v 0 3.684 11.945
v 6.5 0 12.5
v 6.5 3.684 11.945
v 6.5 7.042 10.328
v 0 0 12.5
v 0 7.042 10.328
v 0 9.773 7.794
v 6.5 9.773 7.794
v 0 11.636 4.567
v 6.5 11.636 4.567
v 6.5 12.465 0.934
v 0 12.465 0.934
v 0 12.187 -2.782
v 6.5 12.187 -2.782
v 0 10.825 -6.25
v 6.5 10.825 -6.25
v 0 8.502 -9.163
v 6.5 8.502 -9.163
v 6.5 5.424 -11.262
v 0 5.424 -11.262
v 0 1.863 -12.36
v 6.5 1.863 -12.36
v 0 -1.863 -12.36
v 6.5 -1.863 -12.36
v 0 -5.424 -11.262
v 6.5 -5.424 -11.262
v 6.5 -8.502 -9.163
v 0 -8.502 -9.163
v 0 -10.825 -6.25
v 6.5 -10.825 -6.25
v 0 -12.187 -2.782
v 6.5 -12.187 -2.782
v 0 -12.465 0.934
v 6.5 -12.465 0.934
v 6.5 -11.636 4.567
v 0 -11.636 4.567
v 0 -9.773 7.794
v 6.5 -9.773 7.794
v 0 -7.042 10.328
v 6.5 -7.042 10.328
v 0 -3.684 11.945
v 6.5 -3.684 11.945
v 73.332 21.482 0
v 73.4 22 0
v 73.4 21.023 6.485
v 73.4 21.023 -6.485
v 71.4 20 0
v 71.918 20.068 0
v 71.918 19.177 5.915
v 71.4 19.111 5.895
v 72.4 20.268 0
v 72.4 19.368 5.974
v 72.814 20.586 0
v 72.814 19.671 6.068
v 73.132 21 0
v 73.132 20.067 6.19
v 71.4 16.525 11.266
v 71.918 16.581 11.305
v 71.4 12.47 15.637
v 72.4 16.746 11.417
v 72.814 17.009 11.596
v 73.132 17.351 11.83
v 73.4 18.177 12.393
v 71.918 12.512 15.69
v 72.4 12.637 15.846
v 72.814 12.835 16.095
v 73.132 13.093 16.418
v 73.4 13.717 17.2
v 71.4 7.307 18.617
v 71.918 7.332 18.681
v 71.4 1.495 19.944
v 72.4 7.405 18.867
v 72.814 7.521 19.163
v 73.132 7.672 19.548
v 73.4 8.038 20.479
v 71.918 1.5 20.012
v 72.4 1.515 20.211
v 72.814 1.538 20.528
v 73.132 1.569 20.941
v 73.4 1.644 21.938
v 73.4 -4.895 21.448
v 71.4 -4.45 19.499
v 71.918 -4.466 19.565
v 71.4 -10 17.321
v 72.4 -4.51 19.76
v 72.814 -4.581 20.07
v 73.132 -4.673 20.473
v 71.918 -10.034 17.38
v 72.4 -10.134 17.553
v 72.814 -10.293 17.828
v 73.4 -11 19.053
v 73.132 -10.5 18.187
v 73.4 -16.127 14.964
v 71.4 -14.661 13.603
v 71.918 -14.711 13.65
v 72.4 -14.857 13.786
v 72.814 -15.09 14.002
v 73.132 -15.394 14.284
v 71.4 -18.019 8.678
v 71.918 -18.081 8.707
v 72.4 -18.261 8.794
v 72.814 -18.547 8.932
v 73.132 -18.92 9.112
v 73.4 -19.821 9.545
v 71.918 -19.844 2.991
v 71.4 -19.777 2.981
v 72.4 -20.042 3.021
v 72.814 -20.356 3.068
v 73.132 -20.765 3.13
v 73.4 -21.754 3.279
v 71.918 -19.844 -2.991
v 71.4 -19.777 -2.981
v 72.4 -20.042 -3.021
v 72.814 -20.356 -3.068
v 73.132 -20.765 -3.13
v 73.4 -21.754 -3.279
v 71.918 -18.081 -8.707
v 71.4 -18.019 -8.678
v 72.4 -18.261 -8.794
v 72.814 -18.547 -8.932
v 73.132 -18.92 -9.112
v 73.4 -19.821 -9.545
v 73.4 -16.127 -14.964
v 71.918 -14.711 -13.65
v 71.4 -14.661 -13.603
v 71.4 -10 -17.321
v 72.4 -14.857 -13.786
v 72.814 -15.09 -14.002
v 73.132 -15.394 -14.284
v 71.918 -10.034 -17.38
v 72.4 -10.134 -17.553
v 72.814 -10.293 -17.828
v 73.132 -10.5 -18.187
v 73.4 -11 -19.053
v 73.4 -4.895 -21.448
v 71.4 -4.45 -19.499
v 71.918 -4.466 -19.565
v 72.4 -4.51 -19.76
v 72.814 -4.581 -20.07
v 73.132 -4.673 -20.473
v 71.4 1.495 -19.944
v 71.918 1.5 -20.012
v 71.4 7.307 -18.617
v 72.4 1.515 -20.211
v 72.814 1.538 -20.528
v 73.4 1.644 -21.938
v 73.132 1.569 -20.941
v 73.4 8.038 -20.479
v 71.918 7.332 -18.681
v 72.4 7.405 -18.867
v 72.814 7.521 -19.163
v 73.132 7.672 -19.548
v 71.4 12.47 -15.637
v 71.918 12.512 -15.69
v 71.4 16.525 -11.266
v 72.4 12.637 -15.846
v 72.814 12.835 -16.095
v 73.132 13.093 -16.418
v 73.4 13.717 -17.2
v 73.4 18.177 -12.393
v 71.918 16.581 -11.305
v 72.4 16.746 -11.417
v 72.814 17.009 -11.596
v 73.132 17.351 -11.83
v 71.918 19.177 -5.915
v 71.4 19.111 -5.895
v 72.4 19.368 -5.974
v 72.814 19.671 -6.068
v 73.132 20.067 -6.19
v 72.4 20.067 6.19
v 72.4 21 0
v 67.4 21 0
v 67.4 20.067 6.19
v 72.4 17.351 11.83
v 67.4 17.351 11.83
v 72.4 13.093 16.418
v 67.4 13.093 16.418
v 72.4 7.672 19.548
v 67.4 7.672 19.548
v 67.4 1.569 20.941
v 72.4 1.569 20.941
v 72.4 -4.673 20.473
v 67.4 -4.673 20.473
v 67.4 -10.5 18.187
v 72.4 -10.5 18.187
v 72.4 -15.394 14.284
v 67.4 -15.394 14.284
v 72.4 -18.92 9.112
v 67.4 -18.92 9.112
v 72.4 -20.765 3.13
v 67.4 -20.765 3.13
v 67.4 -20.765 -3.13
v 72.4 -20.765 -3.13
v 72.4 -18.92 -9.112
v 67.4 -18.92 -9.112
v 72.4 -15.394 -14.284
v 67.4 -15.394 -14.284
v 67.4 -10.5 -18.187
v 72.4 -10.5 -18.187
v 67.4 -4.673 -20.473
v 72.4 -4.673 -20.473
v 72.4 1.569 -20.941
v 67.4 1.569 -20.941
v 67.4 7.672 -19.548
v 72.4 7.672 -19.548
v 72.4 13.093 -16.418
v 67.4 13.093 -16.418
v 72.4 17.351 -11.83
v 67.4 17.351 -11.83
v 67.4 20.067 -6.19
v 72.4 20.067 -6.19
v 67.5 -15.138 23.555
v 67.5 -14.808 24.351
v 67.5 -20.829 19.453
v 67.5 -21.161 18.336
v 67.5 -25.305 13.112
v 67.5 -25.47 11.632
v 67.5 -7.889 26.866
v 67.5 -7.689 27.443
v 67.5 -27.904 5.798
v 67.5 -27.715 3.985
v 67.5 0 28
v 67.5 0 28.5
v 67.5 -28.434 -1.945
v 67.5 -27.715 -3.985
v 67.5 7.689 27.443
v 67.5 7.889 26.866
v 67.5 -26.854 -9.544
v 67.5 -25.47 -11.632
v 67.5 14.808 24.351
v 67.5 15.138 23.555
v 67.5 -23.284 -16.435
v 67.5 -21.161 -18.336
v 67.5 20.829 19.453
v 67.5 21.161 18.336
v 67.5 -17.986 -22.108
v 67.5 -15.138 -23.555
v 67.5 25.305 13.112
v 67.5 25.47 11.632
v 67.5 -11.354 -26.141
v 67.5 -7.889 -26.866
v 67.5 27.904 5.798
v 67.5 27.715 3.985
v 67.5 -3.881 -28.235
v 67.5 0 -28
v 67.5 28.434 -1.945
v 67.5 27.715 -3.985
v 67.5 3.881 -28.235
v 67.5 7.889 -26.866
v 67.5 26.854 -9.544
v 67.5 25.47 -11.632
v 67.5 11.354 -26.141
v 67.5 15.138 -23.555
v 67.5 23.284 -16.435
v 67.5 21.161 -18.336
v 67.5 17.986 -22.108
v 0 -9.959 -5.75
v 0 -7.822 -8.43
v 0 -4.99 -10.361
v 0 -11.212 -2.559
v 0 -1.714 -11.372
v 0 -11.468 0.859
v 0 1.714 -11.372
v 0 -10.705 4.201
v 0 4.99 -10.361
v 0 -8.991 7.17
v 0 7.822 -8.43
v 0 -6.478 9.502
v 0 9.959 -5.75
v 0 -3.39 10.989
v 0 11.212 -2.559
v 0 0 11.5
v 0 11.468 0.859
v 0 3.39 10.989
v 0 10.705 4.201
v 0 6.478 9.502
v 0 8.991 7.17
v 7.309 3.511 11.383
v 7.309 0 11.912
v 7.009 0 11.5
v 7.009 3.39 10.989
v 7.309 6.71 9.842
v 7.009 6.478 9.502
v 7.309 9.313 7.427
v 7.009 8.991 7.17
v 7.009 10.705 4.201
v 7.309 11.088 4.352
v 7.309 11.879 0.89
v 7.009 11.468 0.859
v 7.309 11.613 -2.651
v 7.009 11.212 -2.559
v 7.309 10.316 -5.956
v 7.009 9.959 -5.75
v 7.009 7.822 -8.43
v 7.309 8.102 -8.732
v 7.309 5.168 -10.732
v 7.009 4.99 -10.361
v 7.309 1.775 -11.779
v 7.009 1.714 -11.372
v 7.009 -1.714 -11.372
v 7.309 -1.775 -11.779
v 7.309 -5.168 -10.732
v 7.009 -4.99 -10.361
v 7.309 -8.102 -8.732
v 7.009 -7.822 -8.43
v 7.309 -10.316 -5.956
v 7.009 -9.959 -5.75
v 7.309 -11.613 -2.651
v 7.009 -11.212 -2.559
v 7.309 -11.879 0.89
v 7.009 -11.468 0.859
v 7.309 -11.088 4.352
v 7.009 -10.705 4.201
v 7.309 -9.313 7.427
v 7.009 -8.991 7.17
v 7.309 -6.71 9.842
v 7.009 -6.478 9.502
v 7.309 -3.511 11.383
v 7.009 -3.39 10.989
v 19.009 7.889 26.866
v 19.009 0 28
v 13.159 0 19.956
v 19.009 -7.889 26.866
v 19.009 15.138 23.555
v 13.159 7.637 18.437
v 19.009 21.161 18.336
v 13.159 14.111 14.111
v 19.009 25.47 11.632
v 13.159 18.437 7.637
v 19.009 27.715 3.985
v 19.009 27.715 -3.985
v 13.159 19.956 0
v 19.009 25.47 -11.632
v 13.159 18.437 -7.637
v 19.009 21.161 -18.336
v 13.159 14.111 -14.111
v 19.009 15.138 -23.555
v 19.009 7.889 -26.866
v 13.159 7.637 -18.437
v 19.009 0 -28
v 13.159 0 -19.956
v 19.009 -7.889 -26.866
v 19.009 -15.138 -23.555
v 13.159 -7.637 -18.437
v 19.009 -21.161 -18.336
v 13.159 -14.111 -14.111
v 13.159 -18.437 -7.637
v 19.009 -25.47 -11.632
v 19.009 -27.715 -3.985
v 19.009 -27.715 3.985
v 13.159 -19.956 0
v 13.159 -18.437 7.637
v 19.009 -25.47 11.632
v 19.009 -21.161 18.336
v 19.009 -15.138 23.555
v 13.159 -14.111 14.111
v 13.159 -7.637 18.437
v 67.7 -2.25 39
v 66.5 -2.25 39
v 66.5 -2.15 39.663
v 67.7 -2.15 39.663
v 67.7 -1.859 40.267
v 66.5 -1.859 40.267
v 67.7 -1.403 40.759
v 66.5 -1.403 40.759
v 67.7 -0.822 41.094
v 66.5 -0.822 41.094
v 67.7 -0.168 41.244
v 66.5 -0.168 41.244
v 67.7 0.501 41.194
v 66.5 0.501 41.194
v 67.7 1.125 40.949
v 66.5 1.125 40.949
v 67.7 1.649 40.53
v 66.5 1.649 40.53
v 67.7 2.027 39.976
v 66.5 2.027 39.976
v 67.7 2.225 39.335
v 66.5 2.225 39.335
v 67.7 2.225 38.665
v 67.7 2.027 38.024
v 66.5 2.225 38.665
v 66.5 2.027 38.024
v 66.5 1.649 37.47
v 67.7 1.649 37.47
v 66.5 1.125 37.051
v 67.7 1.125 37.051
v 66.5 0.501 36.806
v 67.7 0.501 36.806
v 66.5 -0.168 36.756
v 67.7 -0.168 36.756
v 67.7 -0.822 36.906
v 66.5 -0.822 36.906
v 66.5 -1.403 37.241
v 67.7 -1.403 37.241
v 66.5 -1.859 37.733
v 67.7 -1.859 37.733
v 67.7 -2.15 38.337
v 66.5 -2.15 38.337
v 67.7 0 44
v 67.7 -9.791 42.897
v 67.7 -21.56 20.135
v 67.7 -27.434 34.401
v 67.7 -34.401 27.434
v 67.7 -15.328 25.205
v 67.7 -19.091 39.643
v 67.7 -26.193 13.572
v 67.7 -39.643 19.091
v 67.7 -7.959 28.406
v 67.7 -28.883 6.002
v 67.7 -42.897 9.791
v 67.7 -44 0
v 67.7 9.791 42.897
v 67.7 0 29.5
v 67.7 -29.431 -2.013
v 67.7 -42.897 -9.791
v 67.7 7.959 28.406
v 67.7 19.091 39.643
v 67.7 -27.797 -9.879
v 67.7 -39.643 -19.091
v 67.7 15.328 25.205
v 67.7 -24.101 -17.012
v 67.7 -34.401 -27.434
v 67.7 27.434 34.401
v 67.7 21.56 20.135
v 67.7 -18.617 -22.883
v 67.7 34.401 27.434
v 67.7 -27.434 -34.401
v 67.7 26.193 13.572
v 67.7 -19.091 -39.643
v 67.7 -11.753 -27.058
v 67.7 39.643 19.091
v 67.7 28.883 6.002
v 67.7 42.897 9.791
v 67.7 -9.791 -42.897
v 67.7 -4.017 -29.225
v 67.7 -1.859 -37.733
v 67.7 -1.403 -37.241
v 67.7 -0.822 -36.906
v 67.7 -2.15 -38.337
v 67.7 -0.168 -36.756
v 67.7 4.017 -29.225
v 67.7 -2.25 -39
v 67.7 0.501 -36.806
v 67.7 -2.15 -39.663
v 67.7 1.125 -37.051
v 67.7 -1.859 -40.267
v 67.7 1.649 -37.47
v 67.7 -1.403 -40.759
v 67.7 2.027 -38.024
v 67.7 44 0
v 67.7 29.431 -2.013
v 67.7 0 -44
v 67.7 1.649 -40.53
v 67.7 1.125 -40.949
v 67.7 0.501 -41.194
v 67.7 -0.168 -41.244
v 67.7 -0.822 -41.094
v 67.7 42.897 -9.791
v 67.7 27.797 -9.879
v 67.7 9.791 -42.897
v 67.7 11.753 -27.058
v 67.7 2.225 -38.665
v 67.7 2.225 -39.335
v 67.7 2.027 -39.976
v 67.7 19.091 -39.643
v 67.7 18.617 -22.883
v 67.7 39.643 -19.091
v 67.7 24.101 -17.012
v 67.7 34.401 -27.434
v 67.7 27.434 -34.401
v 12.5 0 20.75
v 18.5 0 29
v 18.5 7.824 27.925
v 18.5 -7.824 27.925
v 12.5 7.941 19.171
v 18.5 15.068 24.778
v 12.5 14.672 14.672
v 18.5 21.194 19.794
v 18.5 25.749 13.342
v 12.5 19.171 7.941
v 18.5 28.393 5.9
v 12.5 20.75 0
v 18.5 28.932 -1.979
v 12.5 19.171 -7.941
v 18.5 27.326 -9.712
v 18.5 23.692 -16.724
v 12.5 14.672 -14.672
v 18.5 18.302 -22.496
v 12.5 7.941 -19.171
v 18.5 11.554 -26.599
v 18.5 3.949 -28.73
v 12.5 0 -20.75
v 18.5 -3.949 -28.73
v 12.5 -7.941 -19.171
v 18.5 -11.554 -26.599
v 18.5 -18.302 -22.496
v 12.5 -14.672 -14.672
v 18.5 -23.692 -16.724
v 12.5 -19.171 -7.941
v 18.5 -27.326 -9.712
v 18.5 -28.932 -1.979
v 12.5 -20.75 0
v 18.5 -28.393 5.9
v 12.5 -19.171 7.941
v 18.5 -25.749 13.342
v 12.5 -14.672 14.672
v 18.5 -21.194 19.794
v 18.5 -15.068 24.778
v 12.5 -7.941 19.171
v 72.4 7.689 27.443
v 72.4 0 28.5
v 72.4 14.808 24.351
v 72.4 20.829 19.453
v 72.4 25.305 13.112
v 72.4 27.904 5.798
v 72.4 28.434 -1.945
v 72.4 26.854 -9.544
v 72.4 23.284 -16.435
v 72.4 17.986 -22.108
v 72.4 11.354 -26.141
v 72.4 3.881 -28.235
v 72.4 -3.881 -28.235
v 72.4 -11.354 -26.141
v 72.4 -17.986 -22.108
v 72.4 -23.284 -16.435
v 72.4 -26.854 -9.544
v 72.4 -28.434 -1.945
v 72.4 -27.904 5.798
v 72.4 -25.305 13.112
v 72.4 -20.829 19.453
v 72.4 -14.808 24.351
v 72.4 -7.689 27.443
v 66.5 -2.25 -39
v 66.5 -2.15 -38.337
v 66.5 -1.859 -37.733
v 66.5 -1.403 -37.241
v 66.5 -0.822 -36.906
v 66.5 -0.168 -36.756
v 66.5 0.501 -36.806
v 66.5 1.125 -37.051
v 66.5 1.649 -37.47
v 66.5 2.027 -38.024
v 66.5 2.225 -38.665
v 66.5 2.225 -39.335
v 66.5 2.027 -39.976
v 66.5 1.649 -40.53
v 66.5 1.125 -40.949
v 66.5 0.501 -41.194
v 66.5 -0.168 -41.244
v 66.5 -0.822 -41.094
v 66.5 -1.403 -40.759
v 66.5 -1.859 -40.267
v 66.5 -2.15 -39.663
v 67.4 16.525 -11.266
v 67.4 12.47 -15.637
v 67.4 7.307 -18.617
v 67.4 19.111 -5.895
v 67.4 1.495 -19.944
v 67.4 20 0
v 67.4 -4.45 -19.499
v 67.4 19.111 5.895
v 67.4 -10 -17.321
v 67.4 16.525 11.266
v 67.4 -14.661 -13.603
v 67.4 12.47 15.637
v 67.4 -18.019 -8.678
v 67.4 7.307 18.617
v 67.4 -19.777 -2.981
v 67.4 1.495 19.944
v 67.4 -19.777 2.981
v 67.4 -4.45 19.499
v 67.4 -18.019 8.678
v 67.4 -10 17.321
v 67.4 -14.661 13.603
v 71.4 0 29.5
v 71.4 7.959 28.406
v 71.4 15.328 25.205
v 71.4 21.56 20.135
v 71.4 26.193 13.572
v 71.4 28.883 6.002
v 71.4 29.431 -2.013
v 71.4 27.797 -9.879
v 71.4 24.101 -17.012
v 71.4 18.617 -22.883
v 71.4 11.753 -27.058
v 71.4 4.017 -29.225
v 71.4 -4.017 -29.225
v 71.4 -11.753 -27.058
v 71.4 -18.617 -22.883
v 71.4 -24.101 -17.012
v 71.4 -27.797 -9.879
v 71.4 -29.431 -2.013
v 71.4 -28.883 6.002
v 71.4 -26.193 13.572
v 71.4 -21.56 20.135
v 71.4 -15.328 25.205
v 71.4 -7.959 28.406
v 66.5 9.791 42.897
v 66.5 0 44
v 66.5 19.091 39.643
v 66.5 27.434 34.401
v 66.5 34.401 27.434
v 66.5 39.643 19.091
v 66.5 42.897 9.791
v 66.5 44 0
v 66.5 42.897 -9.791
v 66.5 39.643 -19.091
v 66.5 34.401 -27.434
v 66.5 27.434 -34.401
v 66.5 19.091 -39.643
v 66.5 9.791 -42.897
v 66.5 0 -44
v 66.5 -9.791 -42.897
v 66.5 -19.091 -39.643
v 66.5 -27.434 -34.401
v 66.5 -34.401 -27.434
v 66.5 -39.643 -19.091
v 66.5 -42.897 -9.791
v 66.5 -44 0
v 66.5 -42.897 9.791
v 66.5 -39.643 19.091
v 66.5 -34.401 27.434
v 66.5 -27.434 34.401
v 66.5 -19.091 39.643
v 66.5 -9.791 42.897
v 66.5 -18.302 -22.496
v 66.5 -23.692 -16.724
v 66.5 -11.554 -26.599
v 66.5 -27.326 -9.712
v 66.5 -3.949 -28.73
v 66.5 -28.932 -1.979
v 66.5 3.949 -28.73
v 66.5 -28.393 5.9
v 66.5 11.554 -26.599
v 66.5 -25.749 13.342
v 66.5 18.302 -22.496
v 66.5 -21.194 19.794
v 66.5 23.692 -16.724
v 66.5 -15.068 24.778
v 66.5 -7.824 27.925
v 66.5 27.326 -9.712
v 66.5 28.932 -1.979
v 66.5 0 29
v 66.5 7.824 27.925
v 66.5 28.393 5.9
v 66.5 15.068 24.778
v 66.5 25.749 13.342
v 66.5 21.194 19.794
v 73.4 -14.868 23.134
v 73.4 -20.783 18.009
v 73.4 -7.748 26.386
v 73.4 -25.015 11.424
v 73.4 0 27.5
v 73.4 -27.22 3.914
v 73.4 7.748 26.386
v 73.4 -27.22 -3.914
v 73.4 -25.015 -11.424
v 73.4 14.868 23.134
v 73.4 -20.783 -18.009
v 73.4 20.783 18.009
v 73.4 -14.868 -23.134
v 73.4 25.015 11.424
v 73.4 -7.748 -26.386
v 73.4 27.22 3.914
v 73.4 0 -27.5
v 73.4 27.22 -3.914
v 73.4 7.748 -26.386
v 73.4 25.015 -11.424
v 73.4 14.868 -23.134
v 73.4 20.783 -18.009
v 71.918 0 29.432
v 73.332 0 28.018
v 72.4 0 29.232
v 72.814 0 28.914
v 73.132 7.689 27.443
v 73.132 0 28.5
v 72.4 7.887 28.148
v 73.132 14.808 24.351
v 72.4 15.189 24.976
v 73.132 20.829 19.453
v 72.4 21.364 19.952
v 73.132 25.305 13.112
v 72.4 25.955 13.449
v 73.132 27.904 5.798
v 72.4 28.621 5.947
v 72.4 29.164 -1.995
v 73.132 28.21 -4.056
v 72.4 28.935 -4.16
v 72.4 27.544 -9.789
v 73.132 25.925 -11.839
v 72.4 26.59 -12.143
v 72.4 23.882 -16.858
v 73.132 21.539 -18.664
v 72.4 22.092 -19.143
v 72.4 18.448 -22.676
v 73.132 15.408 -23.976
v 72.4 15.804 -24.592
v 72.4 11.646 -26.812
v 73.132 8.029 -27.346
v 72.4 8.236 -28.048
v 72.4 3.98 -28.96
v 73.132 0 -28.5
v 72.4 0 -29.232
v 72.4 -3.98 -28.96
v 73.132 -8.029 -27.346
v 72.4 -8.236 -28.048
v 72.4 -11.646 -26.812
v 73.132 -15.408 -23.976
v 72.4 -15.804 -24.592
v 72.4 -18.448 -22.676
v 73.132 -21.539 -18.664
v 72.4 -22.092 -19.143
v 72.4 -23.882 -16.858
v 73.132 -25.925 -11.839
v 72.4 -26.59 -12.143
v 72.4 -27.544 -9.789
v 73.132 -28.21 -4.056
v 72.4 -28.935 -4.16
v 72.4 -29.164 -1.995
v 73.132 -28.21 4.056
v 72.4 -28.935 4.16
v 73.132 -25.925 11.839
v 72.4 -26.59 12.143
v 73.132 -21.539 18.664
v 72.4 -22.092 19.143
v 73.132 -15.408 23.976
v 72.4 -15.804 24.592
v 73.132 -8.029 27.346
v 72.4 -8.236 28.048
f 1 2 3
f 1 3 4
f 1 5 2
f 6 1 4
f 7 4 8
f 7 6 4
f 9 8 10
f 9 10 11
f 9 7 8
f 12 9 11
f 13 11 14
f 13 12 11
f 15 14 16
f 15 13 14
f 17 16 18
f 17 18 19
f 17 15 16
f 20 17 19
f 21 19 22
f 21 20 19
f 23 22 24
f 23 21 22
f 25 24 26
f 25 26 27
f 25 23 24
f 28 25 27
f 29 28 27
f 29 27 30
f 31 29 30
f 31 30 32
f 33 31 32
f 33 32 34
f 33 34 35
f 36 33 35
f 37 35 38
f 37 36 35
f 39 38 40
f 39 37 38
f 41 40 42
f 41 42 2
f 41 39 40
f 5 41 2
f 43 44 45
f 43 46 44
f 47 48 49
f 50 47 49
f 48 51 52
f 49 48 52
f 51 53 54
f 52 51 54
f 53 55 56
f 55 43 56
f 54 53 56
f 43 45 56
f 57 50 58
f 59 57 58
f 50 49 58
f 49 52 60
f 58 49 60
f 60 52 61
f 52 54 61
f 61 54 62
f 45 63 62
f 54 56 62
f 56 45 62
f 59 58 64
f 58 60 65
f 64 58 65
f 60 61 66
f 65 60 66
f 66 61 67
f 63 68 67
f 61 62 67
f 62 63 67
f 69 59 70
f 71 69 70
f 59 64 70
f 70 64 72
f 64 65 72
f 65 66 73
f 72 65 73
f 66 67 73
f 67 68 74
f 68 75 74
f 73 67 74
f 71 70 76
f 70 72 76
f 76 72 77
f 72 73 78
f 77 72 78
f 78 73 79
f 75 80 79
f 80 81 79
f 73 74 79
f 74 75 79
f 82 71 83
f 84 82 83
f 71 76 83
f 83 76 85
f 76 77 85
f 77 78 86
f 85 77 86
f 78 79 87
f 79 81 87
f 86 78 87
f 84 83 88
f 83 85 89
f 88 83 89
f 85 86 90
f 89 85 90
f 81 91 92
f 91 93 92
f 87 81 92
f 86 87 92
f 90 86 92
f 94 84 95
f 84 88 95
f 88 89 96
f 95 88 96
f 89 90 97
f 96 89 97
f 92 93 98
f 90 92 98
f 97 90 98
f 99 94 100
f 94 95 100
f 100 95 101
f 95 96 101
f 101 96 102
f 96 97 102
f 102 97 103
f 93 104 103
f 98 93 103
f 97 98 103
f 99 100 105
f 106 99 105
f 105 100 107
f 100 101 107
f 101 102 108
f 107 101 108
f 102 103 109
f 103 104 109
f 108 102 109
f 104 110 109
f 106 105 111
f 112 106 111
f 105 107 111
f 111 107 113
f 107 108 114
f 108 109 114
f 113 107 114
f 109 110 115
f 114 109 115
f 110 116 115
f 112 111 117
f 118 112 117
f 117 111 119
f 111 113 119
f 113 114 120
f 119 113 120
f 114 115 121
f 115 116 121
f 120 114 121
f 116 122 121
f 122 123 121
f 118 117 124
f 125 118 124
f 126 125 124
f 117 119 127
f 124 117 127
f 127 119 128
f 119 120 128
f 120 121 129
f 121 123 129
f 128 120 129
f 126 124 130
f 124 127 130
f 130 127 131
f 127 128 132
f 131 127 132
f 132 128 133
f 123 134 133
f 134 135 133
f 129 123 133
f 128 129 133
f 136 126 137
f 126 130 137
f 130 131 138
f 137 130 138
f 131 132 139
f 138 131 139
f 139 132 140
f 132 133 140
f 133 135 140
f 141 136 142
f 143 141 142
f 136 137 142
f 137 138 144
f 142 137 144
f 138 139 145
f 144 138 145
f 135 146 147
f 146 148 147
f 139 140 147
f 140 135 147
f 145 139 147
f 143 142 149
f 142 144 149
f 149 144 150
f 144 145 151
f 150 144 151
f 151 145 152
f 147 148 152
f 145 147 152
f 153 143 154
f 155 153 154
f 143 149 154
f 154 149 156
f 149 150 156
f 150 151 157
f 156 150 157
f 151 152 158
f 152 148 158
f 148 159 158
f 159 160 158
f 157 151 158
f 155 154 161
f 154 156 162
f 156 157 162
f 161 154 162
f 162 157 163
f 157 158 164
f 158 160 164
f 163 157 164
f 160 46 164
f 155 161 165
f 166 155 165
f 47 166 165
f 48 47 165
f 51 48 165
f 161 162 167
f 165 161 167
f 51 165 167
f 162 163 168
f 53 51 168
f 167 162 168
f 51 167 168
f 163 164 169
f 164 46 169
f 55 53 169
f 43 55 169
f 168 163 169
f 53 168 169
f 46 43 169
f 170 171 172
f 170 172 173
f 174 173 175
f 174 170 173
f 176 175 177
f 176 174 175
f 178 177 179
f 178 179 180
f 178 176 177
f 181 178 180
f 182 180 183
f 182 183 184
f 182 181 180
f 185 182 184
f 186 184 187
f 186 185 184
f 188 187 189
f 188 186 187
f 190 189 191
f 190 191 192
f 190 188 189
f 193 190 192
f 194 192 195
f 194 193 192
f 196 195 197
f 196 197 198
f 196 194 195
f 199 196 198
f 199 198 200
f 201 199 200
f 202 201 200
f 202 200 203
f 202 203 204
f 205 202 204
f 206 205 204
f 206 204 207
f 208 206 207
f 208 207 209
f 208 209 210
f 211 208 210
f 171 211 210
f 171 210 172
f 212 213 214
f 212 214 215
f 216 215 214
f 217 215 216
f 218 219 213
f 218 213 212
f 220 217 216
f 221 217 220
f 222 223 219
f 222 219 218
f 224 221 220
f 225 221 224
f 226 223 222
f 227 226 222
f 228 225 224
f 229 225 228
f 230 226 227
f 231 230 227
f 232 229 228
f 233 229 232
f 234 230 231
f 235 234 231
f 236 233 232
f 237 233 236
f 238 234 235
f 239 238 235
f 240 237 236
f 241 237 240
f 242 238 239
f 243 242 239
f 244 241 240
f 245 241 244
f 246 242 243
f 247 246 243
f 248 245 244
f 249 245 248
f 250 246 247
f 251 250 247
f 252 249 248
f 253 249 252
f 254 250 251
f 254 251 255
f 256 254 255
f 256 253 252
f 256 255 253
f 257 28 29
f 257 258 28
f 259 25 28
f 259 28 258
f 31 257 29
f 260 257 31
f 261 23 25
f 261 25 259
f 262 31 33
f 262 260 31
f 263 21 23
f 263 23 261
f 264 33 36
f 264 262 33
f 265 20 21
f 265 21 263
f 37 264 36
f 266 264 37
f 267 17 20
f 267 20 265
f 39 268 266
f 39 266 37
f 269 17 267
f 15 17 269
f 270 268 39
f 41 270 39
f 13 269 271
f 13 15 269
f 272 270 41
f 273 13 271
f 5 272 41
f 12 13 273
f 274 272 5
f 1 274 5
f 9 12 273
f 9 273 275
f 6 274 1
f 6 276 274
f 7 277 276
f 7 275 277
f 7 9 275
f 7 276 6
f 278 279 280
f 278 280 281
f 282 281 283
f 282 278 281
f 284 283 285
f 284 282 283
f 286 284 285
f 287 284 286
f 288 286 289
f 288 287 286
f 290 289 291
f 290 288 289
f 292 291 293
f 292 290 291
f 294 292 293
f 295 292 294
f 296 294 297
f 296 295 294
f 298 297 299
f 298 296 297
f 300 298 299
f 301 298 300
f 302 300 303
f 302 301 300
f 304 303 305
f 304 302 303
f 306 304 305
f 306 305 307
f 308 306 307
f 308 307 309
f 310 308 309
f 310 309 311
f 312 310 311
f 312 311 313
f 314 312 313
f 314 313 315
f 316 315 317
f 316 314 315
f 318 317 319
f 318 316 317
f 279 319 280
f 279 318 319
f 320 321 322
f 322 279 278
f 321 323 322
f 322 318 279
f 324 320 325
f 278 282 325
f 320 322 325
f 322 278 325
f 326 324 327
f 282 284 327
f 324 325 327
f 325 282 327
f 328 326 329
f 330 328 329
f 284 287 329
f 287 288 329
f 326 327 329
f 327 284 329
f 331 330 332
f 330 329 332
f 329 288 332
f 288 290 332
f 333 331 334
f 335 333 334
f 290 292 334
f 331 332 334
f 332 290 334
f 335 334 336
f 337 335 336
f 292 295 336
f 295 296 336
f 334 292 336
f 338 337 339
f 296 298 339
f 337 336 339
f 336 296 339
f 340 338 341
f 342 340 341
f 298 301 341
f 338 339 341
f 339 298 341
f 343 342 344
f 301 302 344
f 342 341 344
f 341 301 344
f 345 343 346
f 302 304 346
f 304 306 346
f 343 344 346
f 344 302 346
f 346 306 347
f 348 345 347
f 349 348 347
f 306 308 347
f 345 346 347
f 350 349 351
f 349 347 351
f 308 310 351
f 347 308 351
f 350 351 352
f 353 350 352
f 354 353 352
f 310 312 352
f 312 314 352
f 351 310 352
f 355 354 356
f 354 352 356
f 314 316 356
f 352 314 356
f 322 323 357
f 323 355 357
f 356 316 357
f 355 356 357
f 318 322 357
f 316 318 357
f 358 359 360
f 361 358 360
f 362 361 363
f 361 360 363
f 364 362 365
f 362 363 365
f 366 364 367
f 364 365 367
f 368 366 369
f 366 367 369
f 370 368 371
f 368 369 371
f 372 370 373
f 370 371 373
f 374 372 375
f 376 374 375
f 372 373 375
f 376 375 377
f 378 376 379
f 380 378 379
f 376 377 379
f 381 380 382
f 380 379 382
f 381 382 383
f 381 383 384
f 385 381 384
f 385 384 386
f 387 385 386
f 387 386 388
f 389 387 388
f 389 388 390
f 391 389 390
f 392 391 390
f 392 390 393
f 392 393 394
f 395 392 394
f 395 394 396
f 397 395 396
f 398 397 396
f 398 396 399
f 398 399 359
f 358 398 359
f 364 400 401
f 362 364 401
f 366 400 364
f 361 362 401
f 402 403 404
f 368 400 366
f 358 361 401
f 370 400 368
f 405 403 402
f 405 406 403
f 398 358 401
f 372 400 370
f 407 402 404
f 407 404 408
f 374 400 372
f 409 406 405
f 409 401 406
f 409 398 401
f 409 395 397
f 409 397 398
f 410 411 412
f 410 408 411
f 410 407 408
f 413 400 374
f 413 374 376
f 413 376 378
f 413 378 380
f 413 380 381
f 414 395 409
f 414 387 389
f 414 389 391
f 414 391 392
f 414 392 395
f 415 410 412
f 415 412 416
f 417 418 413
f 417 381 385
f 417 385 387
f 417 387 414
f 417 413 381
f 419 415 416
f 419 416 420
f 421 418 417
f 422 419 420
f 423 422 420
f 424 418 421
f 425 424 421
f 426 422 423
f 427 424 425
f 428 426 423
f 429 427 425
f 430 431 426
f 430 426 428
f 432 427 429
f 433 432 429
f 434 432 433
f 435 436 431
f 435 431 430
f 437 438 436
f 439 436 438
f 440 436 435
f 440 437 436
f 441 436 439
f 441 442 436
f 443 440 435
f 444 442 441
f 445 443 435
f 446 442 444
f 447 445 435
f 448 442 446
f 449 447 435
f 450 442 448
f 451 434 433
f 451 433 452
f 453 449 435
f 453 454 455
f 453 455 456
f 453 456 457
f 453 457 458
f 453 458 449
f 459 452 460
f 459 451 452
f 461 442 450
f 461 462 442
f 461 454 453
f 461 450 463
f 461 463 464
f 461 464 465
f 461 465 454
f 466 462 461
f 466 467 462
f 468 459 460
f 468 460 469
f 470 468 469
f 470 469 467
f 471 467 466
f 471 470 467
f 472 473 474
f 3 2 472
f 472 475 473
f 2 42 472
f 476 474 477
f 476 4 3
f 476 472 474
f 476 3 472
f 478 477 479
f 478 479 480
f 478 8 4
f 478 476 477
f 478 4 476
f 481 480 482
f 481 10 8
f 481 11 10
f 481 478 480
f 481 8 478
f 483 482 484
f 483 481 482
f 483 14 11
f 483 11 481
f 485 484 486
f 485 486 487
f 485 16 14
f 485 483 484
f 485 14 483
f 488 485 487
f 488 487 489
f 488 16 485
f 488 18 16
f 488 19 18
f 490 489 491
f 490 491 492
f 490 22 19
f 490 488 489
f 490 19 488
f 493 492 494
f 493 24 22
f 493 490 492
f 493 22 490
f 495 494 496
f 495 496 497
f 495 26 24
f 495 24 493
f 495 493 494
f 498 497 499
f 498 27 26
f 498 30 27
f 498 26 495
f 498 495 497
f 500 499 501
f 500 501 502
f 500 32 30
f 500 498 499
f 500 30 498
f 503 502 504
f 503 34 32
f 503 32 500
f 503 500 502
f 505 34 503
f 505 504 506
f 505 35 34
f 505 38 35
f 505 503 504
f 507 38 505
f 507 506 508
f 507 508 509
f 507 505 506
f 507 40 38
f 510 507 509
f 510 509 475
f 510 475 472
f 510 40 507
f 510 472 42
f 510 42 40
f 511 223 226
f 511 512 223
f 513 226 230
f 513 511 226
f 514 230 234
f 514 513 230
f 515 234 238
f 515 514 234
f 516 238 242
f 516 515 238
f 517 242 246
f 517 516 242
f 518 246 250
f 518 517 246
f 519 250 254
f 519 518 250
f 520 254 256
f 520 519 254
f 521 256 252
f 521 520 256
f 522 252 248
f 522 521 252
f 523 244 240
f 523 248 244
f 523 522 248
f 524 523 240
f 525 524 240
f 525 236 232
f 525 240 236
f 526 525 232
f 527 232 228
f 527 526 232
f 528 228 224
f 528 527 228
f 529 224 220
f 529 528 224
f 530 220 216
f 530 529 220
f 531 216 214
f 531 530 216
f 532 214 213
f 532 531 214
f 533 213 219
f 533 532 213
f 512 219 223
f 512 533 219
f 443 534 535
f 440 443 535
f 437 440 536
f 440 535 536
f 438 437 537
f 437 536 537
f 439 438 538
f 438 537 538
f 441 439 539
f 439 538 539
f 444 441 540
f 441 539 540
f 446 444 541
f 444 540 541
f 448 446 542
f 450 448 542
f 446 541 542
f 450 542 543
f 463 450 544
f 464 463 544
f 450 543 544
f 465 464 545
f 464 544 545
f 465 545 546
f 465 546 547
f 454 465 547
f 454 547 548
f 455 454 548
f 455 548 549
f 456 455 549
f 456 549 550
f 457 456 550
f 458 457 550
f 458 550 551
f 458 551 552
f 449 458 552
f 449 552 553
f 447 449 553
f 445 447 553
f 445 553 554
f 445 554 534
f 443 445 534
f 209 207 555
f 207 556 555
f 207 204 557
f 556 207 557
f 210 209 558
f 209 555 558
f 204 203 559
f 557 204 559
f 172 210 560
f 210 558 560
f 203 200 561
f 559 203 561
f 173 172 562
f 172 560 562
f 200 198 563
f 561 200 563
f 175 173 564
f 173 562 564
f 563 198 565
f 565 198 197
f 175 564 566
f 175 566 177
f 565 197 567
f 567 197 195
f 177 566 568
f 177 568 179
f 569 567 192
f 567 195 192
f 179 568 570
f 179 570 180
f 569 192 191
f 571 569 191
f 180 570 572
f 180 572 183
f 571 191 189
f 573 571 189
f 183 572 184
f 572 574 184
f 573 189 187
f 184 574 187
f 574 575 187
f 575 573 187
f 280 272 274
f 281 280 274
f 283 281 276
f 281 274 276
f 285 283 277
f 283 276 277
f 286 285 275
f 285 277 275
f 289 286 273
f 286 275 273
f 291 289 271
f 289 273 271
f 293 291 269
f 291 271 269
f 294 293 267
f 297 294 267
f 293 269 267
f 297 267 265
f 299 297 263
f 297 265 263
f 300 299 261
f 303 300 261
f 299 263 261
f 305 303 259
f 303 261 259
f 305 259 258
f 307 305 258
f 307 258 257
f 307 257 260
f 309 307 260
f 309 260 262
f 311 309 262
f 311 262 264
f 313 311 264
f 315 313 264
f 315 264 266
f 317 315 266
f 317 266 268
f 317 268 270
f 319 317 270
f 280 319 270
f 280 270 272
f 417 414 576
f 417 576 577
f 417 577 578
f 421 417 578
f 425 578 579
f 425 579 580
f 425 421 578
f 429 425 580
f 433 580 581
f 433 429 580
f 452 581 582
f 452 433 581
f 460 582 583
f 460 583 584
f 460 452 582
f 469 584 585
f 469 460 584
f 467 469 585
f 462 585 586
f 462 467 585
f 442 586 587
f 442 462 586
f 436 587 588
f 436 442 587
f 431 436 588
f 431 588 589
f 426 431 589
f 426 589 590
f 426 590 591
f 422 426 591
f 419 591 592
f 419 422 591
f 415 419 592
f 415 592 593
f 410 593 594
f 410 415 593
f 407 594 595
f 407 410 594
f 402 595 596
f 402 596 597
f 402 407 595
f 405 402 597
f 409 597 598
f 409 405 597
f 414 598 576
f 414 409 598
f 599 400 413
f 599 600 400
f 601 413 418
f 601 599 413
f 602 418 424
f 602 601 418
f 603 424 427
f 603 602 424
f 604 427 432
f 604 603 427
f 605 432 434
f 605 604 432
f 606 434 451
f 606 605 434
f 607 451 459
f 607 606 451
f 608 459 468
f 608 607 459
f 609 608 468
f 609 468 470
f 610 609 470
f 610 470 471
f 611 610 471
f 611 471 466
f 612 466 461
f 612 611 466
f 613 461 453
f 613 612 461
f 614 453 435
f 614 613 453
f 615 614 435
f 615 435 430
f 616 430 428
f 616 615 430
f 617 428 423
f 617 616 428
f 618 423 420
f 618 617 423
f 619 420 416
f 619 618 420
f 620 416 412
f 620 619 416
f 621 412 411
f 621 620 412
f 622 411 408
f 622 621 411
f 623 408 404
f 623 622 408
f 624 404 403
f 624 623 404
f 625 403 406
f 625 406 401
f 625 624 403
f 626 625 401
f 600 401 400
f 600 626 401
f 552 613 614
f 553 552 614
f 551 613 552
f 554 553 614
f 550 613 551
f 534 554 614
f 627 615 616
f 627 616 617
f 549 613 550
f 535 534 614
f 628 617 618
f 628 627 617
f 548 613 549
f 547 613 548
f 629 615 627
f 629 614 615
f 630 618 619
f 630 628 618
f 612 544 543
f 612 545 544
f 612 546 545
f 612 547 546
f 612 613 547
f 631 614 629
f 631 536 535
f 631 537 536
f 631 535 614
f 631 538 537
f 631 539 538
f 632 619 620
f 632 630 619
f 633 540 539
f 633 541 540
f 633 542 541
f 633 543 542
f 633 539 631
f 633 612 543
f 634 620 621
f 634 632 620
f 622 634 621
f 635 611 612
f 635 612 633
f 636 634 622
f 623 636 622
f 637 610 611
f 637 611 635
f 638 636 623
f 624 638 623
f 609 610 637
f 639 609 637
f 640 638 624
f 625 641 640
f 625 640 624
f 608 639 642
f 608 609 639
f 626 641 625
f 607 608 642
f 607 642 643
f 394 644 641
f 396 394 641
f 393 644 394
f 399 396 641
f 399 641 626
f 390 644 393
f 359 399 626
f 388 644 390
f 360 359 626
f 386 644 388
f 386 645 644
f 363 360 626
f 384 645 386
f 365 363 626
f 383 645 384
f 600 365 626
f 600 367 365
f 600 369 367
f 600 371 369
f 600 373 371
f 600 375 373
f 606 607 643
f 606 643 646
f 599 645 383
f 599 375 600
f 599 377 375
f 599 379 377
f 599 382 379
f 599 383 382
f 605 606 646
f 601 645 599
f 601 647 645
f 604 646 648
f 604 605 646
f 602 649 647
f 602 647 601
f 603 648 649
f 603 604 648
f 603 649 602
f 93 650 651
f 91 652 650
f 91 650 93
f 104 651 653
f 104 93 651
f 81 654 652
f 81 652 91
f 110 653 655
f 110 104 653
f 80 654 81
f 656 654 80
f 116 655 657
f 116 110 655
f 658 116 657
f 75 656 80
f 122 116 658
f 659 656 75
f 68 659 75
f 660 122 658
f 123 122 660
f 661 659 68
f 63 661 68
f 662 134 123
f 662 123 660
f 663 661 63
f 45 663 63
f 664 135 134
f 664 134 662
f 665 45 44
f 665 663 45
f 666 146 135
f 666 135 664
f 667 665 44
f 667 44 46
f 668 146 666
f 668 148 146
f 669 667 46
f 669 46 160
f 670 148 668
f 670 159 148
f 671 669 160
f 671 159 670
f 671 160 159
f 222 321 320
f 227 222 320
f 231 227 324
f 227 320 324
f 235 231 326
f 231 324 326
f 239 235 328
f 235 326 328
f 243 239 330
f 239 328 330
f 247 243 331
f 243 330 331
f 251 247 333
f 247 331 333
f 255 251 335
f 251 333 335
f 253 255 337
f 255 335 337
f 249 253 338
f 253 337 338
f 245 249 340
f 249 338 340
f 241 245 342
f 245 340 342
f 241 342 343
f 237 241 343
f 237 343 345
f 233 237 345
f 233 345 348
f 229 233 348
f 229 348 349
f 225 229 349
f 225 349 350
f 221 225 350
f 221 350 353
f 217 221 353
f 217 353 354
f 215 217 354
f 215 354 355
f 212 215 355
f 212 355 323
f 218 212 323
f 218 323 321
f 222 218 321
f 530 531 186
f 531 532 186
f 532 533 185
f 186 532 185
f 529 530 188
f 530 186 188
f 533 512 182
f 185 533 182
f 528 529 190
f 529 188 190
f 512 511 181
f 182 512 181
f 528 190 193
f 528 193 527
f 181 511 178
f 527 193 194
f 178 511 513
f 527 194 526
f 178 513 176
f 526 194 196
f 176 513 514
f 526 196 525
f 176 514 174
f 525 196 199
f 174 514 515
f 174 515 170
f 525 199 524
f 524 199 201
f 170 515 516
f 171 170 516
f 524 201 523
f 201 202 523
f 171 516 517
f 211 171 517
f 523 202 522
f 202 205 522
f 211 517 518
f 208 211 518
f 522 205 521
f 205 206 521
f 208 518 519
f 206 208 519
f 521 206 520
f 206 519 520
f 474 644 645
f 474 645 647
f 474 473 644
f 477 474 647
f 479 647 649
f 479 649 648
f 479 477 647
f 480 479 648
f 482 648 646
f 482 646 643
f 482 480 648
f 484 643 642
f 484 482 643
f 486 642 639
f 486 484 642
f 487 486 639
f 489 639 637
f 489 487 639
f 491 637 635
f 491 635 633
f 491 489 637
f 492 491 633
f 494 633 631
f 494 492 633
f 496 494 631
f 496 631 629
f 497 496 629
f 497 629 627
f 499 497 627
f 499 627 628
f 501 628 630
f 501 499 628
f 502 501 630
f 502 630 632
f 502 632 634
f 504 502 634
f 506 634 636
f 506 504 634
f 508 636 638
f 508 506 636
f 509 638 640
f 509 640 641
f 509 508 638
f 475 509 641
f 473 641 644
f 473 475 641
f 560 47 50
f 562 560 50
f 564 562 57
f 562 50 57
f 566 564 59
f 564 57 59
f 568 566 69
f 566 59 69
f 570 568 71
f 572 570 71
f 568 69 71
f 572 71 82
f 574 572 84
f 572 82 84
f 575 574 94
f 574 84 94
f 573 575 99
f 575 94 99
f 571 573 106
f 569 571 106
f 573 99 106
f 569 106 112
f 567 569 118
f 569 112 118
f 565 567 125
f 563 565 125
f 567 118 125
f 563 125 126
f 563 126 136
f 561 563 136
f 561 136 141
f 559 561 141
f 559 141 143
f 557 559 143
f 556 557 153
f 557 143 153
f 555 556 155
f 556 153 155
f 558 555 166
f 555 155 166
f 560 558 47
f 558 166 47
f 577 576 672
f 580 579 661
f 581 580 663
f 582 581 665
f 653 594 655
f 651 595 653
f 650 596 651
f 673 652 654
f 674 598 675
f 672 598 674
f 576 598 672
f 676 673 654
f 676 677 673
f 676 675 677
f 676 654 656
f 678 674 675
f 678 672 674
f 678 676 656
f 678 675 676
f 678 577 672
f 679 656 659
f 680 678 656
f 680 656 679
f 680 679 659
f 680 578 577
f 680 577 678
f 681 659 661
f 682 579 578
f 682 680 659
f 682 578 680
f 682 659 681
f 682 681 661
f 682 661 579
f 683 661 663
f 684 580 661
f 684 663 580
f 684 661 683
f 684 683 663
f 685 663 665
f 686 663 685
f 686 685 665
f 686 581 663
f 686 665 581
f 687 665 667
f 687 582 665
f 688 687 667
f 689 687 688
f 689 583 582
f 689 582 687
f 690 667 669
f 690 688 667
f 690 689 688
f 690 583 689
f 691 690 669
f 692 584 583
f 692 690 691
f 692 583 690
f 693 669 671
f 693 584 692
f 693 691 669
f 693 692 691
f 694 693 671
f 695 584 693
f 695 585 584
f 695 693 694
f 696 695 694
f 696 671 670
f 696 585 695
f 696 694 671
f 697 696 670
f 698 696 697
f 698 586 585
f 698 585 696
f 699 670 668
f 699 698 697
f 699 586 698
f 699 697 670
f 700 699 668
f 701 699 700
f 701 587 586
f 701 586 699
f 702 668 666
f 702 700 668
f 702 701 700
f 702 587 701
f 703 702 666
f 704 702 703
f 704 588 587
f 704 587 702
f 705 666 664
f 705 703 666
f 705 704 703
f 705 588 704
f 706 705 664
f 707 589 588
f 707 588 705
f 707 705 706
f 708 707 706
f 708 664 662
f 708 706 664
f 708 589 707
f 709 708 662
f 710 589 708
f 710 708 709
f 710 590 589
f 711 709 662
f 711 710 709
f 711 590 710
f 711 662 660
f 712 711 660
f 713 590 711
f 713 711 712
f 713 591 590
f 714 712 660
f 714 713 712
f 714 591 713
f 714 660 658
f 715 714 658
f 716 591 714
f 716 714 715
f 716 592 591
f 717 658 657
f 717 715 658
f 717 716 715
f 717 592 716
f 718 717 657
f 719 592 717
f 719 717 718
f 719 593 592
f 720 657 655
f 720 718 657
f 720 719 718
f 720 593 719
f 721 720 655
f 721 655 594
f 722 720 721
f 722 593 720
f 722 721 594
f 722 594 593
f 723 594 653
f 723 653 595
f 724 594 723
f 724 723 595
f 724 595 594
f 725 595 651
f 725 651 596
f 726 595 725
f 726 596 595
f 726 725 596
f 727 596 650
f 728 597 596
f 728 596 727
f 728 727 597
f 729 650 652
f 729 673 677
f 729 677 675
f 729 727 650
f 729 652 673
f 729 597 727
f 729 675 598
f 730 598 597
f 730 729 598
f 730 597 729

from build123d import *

# Parameters (mm, degrees)
F2_R     = 20
F3_DEPTH = 6
F4_T     = 1
F5_R     = 2
F7_D     = 4.5


# Not quite as in the source:
# - a shell that OpenCascade refuses in one call is made with other operations: the cavity is built on its own and cut out


with BuildPart() as f1:
    # F0 (on Front) → F1 (revolve)
    with BuildSketch(Plane.XZ):
        Polygon((0, 12.5), (0, 0), (73.4, 0), (73.4, 29.5), (67.7, 29.5), (67.7, 44), (66.5, 44), (66.5, 29), (18.5, 29), (6.5, 12.5), align=None)
    revolve(axis=Axis((36.7, 0, 0), (-1, 0, 0)))

    # F2 (on face) → F3 (cut)
    with BuildSketch(Plane.YZ.offset(73.4)):
        Circle(F2_R)
    extrude(amount=-F3_DEPTH, mode=Mode.SUBTRACT)

    # F4: shell of thickness 1, made by hand


with BuildPart() as f4_core1:
    # F4_t2: copy of F1
    add(f1.part)

    # the walls: a layer under each face that stays
    f4_faces = [f4_core1.faces().sort_by_distance(p)[0] for p in [
        (3.25, 0, -12.5),
        (12.5, 0, -20.75),
        (42.5, 0, -29),
        (66.5, -29.3333333333, -29.3333333333),
        (67.1, 0, -44),
        (67.7, -29.3333333333, 29.3333333333),
        (70.55, 0, -29.5),
        (73.4, -19.6666666667, 19.6666666667),
        (70.4, -20, 0),
    ]]
    thicken(f4_faces, amount=-F4_T, mode=Mode.SUBTRACT)

    # F4_s3 → F4_t4 (revolve, cut)
    with BuildSketch(Plane.XZ):
        Polygon((6.4919126392, 12.515881717), (6.5, 11.5), (7.0092245917, 11.5), (7.3087360843, 11.9118283023), align=None)
    revolve(axis=Axis((6.5, 0, 0), (-1, 0, 0)), mode=Mode.SUBTRACT)

    # F4_s5 → F4_t6 (revolve, cut)
    with BuildSketch(Plane.XZ):
        Polygon((66.49, 29.01), (66.5, 28), (67.5, 28), (67.5, 29), align=None)
    revolve(axis=Axis((66.5, 0, 0), (-1, 0, 0)), mode=Mode.SUBTRACT)

    # F4_s7 → F4_t8 (revolve, cut)
    with BuildSketch(Plane.XZ):
        Polygon((67.71, 29.51), (66.7, 29.5), (66.7, 28.5), (67.7, 28.5), align=None)
    revolve(axis=Axis((67.7, 0, 0), (-1, 0, 0)), mode=Mode.SUBTRACT)


with BuildPart() as f1_1:
    add(f1.part)

    # what is left inside the walls is the cavity
    f4_cavity = [f4_core1.part.solids().sort_by_distance(p)[0] for p in [
        (50.669742, 0, -27.99),
    ]]
    add(f4_cavity, mode=Mode.SUBTRACT)

    # F5
    f5_edges = [f1_1.edges().sort_by_distance(p)[0] for p in [
        (73.4, 0, -29.5),
        (73.4, -20, 0),
    ]]
    fillet(f5_edges, radius=F5_R)

    # F7 (through all)
    with Locations(Plane.YZ.offset(67.7)):
        with Locations((0, 39), (0, -39)):
            Hole(F7_D / 2)


solid = f1_1.part
